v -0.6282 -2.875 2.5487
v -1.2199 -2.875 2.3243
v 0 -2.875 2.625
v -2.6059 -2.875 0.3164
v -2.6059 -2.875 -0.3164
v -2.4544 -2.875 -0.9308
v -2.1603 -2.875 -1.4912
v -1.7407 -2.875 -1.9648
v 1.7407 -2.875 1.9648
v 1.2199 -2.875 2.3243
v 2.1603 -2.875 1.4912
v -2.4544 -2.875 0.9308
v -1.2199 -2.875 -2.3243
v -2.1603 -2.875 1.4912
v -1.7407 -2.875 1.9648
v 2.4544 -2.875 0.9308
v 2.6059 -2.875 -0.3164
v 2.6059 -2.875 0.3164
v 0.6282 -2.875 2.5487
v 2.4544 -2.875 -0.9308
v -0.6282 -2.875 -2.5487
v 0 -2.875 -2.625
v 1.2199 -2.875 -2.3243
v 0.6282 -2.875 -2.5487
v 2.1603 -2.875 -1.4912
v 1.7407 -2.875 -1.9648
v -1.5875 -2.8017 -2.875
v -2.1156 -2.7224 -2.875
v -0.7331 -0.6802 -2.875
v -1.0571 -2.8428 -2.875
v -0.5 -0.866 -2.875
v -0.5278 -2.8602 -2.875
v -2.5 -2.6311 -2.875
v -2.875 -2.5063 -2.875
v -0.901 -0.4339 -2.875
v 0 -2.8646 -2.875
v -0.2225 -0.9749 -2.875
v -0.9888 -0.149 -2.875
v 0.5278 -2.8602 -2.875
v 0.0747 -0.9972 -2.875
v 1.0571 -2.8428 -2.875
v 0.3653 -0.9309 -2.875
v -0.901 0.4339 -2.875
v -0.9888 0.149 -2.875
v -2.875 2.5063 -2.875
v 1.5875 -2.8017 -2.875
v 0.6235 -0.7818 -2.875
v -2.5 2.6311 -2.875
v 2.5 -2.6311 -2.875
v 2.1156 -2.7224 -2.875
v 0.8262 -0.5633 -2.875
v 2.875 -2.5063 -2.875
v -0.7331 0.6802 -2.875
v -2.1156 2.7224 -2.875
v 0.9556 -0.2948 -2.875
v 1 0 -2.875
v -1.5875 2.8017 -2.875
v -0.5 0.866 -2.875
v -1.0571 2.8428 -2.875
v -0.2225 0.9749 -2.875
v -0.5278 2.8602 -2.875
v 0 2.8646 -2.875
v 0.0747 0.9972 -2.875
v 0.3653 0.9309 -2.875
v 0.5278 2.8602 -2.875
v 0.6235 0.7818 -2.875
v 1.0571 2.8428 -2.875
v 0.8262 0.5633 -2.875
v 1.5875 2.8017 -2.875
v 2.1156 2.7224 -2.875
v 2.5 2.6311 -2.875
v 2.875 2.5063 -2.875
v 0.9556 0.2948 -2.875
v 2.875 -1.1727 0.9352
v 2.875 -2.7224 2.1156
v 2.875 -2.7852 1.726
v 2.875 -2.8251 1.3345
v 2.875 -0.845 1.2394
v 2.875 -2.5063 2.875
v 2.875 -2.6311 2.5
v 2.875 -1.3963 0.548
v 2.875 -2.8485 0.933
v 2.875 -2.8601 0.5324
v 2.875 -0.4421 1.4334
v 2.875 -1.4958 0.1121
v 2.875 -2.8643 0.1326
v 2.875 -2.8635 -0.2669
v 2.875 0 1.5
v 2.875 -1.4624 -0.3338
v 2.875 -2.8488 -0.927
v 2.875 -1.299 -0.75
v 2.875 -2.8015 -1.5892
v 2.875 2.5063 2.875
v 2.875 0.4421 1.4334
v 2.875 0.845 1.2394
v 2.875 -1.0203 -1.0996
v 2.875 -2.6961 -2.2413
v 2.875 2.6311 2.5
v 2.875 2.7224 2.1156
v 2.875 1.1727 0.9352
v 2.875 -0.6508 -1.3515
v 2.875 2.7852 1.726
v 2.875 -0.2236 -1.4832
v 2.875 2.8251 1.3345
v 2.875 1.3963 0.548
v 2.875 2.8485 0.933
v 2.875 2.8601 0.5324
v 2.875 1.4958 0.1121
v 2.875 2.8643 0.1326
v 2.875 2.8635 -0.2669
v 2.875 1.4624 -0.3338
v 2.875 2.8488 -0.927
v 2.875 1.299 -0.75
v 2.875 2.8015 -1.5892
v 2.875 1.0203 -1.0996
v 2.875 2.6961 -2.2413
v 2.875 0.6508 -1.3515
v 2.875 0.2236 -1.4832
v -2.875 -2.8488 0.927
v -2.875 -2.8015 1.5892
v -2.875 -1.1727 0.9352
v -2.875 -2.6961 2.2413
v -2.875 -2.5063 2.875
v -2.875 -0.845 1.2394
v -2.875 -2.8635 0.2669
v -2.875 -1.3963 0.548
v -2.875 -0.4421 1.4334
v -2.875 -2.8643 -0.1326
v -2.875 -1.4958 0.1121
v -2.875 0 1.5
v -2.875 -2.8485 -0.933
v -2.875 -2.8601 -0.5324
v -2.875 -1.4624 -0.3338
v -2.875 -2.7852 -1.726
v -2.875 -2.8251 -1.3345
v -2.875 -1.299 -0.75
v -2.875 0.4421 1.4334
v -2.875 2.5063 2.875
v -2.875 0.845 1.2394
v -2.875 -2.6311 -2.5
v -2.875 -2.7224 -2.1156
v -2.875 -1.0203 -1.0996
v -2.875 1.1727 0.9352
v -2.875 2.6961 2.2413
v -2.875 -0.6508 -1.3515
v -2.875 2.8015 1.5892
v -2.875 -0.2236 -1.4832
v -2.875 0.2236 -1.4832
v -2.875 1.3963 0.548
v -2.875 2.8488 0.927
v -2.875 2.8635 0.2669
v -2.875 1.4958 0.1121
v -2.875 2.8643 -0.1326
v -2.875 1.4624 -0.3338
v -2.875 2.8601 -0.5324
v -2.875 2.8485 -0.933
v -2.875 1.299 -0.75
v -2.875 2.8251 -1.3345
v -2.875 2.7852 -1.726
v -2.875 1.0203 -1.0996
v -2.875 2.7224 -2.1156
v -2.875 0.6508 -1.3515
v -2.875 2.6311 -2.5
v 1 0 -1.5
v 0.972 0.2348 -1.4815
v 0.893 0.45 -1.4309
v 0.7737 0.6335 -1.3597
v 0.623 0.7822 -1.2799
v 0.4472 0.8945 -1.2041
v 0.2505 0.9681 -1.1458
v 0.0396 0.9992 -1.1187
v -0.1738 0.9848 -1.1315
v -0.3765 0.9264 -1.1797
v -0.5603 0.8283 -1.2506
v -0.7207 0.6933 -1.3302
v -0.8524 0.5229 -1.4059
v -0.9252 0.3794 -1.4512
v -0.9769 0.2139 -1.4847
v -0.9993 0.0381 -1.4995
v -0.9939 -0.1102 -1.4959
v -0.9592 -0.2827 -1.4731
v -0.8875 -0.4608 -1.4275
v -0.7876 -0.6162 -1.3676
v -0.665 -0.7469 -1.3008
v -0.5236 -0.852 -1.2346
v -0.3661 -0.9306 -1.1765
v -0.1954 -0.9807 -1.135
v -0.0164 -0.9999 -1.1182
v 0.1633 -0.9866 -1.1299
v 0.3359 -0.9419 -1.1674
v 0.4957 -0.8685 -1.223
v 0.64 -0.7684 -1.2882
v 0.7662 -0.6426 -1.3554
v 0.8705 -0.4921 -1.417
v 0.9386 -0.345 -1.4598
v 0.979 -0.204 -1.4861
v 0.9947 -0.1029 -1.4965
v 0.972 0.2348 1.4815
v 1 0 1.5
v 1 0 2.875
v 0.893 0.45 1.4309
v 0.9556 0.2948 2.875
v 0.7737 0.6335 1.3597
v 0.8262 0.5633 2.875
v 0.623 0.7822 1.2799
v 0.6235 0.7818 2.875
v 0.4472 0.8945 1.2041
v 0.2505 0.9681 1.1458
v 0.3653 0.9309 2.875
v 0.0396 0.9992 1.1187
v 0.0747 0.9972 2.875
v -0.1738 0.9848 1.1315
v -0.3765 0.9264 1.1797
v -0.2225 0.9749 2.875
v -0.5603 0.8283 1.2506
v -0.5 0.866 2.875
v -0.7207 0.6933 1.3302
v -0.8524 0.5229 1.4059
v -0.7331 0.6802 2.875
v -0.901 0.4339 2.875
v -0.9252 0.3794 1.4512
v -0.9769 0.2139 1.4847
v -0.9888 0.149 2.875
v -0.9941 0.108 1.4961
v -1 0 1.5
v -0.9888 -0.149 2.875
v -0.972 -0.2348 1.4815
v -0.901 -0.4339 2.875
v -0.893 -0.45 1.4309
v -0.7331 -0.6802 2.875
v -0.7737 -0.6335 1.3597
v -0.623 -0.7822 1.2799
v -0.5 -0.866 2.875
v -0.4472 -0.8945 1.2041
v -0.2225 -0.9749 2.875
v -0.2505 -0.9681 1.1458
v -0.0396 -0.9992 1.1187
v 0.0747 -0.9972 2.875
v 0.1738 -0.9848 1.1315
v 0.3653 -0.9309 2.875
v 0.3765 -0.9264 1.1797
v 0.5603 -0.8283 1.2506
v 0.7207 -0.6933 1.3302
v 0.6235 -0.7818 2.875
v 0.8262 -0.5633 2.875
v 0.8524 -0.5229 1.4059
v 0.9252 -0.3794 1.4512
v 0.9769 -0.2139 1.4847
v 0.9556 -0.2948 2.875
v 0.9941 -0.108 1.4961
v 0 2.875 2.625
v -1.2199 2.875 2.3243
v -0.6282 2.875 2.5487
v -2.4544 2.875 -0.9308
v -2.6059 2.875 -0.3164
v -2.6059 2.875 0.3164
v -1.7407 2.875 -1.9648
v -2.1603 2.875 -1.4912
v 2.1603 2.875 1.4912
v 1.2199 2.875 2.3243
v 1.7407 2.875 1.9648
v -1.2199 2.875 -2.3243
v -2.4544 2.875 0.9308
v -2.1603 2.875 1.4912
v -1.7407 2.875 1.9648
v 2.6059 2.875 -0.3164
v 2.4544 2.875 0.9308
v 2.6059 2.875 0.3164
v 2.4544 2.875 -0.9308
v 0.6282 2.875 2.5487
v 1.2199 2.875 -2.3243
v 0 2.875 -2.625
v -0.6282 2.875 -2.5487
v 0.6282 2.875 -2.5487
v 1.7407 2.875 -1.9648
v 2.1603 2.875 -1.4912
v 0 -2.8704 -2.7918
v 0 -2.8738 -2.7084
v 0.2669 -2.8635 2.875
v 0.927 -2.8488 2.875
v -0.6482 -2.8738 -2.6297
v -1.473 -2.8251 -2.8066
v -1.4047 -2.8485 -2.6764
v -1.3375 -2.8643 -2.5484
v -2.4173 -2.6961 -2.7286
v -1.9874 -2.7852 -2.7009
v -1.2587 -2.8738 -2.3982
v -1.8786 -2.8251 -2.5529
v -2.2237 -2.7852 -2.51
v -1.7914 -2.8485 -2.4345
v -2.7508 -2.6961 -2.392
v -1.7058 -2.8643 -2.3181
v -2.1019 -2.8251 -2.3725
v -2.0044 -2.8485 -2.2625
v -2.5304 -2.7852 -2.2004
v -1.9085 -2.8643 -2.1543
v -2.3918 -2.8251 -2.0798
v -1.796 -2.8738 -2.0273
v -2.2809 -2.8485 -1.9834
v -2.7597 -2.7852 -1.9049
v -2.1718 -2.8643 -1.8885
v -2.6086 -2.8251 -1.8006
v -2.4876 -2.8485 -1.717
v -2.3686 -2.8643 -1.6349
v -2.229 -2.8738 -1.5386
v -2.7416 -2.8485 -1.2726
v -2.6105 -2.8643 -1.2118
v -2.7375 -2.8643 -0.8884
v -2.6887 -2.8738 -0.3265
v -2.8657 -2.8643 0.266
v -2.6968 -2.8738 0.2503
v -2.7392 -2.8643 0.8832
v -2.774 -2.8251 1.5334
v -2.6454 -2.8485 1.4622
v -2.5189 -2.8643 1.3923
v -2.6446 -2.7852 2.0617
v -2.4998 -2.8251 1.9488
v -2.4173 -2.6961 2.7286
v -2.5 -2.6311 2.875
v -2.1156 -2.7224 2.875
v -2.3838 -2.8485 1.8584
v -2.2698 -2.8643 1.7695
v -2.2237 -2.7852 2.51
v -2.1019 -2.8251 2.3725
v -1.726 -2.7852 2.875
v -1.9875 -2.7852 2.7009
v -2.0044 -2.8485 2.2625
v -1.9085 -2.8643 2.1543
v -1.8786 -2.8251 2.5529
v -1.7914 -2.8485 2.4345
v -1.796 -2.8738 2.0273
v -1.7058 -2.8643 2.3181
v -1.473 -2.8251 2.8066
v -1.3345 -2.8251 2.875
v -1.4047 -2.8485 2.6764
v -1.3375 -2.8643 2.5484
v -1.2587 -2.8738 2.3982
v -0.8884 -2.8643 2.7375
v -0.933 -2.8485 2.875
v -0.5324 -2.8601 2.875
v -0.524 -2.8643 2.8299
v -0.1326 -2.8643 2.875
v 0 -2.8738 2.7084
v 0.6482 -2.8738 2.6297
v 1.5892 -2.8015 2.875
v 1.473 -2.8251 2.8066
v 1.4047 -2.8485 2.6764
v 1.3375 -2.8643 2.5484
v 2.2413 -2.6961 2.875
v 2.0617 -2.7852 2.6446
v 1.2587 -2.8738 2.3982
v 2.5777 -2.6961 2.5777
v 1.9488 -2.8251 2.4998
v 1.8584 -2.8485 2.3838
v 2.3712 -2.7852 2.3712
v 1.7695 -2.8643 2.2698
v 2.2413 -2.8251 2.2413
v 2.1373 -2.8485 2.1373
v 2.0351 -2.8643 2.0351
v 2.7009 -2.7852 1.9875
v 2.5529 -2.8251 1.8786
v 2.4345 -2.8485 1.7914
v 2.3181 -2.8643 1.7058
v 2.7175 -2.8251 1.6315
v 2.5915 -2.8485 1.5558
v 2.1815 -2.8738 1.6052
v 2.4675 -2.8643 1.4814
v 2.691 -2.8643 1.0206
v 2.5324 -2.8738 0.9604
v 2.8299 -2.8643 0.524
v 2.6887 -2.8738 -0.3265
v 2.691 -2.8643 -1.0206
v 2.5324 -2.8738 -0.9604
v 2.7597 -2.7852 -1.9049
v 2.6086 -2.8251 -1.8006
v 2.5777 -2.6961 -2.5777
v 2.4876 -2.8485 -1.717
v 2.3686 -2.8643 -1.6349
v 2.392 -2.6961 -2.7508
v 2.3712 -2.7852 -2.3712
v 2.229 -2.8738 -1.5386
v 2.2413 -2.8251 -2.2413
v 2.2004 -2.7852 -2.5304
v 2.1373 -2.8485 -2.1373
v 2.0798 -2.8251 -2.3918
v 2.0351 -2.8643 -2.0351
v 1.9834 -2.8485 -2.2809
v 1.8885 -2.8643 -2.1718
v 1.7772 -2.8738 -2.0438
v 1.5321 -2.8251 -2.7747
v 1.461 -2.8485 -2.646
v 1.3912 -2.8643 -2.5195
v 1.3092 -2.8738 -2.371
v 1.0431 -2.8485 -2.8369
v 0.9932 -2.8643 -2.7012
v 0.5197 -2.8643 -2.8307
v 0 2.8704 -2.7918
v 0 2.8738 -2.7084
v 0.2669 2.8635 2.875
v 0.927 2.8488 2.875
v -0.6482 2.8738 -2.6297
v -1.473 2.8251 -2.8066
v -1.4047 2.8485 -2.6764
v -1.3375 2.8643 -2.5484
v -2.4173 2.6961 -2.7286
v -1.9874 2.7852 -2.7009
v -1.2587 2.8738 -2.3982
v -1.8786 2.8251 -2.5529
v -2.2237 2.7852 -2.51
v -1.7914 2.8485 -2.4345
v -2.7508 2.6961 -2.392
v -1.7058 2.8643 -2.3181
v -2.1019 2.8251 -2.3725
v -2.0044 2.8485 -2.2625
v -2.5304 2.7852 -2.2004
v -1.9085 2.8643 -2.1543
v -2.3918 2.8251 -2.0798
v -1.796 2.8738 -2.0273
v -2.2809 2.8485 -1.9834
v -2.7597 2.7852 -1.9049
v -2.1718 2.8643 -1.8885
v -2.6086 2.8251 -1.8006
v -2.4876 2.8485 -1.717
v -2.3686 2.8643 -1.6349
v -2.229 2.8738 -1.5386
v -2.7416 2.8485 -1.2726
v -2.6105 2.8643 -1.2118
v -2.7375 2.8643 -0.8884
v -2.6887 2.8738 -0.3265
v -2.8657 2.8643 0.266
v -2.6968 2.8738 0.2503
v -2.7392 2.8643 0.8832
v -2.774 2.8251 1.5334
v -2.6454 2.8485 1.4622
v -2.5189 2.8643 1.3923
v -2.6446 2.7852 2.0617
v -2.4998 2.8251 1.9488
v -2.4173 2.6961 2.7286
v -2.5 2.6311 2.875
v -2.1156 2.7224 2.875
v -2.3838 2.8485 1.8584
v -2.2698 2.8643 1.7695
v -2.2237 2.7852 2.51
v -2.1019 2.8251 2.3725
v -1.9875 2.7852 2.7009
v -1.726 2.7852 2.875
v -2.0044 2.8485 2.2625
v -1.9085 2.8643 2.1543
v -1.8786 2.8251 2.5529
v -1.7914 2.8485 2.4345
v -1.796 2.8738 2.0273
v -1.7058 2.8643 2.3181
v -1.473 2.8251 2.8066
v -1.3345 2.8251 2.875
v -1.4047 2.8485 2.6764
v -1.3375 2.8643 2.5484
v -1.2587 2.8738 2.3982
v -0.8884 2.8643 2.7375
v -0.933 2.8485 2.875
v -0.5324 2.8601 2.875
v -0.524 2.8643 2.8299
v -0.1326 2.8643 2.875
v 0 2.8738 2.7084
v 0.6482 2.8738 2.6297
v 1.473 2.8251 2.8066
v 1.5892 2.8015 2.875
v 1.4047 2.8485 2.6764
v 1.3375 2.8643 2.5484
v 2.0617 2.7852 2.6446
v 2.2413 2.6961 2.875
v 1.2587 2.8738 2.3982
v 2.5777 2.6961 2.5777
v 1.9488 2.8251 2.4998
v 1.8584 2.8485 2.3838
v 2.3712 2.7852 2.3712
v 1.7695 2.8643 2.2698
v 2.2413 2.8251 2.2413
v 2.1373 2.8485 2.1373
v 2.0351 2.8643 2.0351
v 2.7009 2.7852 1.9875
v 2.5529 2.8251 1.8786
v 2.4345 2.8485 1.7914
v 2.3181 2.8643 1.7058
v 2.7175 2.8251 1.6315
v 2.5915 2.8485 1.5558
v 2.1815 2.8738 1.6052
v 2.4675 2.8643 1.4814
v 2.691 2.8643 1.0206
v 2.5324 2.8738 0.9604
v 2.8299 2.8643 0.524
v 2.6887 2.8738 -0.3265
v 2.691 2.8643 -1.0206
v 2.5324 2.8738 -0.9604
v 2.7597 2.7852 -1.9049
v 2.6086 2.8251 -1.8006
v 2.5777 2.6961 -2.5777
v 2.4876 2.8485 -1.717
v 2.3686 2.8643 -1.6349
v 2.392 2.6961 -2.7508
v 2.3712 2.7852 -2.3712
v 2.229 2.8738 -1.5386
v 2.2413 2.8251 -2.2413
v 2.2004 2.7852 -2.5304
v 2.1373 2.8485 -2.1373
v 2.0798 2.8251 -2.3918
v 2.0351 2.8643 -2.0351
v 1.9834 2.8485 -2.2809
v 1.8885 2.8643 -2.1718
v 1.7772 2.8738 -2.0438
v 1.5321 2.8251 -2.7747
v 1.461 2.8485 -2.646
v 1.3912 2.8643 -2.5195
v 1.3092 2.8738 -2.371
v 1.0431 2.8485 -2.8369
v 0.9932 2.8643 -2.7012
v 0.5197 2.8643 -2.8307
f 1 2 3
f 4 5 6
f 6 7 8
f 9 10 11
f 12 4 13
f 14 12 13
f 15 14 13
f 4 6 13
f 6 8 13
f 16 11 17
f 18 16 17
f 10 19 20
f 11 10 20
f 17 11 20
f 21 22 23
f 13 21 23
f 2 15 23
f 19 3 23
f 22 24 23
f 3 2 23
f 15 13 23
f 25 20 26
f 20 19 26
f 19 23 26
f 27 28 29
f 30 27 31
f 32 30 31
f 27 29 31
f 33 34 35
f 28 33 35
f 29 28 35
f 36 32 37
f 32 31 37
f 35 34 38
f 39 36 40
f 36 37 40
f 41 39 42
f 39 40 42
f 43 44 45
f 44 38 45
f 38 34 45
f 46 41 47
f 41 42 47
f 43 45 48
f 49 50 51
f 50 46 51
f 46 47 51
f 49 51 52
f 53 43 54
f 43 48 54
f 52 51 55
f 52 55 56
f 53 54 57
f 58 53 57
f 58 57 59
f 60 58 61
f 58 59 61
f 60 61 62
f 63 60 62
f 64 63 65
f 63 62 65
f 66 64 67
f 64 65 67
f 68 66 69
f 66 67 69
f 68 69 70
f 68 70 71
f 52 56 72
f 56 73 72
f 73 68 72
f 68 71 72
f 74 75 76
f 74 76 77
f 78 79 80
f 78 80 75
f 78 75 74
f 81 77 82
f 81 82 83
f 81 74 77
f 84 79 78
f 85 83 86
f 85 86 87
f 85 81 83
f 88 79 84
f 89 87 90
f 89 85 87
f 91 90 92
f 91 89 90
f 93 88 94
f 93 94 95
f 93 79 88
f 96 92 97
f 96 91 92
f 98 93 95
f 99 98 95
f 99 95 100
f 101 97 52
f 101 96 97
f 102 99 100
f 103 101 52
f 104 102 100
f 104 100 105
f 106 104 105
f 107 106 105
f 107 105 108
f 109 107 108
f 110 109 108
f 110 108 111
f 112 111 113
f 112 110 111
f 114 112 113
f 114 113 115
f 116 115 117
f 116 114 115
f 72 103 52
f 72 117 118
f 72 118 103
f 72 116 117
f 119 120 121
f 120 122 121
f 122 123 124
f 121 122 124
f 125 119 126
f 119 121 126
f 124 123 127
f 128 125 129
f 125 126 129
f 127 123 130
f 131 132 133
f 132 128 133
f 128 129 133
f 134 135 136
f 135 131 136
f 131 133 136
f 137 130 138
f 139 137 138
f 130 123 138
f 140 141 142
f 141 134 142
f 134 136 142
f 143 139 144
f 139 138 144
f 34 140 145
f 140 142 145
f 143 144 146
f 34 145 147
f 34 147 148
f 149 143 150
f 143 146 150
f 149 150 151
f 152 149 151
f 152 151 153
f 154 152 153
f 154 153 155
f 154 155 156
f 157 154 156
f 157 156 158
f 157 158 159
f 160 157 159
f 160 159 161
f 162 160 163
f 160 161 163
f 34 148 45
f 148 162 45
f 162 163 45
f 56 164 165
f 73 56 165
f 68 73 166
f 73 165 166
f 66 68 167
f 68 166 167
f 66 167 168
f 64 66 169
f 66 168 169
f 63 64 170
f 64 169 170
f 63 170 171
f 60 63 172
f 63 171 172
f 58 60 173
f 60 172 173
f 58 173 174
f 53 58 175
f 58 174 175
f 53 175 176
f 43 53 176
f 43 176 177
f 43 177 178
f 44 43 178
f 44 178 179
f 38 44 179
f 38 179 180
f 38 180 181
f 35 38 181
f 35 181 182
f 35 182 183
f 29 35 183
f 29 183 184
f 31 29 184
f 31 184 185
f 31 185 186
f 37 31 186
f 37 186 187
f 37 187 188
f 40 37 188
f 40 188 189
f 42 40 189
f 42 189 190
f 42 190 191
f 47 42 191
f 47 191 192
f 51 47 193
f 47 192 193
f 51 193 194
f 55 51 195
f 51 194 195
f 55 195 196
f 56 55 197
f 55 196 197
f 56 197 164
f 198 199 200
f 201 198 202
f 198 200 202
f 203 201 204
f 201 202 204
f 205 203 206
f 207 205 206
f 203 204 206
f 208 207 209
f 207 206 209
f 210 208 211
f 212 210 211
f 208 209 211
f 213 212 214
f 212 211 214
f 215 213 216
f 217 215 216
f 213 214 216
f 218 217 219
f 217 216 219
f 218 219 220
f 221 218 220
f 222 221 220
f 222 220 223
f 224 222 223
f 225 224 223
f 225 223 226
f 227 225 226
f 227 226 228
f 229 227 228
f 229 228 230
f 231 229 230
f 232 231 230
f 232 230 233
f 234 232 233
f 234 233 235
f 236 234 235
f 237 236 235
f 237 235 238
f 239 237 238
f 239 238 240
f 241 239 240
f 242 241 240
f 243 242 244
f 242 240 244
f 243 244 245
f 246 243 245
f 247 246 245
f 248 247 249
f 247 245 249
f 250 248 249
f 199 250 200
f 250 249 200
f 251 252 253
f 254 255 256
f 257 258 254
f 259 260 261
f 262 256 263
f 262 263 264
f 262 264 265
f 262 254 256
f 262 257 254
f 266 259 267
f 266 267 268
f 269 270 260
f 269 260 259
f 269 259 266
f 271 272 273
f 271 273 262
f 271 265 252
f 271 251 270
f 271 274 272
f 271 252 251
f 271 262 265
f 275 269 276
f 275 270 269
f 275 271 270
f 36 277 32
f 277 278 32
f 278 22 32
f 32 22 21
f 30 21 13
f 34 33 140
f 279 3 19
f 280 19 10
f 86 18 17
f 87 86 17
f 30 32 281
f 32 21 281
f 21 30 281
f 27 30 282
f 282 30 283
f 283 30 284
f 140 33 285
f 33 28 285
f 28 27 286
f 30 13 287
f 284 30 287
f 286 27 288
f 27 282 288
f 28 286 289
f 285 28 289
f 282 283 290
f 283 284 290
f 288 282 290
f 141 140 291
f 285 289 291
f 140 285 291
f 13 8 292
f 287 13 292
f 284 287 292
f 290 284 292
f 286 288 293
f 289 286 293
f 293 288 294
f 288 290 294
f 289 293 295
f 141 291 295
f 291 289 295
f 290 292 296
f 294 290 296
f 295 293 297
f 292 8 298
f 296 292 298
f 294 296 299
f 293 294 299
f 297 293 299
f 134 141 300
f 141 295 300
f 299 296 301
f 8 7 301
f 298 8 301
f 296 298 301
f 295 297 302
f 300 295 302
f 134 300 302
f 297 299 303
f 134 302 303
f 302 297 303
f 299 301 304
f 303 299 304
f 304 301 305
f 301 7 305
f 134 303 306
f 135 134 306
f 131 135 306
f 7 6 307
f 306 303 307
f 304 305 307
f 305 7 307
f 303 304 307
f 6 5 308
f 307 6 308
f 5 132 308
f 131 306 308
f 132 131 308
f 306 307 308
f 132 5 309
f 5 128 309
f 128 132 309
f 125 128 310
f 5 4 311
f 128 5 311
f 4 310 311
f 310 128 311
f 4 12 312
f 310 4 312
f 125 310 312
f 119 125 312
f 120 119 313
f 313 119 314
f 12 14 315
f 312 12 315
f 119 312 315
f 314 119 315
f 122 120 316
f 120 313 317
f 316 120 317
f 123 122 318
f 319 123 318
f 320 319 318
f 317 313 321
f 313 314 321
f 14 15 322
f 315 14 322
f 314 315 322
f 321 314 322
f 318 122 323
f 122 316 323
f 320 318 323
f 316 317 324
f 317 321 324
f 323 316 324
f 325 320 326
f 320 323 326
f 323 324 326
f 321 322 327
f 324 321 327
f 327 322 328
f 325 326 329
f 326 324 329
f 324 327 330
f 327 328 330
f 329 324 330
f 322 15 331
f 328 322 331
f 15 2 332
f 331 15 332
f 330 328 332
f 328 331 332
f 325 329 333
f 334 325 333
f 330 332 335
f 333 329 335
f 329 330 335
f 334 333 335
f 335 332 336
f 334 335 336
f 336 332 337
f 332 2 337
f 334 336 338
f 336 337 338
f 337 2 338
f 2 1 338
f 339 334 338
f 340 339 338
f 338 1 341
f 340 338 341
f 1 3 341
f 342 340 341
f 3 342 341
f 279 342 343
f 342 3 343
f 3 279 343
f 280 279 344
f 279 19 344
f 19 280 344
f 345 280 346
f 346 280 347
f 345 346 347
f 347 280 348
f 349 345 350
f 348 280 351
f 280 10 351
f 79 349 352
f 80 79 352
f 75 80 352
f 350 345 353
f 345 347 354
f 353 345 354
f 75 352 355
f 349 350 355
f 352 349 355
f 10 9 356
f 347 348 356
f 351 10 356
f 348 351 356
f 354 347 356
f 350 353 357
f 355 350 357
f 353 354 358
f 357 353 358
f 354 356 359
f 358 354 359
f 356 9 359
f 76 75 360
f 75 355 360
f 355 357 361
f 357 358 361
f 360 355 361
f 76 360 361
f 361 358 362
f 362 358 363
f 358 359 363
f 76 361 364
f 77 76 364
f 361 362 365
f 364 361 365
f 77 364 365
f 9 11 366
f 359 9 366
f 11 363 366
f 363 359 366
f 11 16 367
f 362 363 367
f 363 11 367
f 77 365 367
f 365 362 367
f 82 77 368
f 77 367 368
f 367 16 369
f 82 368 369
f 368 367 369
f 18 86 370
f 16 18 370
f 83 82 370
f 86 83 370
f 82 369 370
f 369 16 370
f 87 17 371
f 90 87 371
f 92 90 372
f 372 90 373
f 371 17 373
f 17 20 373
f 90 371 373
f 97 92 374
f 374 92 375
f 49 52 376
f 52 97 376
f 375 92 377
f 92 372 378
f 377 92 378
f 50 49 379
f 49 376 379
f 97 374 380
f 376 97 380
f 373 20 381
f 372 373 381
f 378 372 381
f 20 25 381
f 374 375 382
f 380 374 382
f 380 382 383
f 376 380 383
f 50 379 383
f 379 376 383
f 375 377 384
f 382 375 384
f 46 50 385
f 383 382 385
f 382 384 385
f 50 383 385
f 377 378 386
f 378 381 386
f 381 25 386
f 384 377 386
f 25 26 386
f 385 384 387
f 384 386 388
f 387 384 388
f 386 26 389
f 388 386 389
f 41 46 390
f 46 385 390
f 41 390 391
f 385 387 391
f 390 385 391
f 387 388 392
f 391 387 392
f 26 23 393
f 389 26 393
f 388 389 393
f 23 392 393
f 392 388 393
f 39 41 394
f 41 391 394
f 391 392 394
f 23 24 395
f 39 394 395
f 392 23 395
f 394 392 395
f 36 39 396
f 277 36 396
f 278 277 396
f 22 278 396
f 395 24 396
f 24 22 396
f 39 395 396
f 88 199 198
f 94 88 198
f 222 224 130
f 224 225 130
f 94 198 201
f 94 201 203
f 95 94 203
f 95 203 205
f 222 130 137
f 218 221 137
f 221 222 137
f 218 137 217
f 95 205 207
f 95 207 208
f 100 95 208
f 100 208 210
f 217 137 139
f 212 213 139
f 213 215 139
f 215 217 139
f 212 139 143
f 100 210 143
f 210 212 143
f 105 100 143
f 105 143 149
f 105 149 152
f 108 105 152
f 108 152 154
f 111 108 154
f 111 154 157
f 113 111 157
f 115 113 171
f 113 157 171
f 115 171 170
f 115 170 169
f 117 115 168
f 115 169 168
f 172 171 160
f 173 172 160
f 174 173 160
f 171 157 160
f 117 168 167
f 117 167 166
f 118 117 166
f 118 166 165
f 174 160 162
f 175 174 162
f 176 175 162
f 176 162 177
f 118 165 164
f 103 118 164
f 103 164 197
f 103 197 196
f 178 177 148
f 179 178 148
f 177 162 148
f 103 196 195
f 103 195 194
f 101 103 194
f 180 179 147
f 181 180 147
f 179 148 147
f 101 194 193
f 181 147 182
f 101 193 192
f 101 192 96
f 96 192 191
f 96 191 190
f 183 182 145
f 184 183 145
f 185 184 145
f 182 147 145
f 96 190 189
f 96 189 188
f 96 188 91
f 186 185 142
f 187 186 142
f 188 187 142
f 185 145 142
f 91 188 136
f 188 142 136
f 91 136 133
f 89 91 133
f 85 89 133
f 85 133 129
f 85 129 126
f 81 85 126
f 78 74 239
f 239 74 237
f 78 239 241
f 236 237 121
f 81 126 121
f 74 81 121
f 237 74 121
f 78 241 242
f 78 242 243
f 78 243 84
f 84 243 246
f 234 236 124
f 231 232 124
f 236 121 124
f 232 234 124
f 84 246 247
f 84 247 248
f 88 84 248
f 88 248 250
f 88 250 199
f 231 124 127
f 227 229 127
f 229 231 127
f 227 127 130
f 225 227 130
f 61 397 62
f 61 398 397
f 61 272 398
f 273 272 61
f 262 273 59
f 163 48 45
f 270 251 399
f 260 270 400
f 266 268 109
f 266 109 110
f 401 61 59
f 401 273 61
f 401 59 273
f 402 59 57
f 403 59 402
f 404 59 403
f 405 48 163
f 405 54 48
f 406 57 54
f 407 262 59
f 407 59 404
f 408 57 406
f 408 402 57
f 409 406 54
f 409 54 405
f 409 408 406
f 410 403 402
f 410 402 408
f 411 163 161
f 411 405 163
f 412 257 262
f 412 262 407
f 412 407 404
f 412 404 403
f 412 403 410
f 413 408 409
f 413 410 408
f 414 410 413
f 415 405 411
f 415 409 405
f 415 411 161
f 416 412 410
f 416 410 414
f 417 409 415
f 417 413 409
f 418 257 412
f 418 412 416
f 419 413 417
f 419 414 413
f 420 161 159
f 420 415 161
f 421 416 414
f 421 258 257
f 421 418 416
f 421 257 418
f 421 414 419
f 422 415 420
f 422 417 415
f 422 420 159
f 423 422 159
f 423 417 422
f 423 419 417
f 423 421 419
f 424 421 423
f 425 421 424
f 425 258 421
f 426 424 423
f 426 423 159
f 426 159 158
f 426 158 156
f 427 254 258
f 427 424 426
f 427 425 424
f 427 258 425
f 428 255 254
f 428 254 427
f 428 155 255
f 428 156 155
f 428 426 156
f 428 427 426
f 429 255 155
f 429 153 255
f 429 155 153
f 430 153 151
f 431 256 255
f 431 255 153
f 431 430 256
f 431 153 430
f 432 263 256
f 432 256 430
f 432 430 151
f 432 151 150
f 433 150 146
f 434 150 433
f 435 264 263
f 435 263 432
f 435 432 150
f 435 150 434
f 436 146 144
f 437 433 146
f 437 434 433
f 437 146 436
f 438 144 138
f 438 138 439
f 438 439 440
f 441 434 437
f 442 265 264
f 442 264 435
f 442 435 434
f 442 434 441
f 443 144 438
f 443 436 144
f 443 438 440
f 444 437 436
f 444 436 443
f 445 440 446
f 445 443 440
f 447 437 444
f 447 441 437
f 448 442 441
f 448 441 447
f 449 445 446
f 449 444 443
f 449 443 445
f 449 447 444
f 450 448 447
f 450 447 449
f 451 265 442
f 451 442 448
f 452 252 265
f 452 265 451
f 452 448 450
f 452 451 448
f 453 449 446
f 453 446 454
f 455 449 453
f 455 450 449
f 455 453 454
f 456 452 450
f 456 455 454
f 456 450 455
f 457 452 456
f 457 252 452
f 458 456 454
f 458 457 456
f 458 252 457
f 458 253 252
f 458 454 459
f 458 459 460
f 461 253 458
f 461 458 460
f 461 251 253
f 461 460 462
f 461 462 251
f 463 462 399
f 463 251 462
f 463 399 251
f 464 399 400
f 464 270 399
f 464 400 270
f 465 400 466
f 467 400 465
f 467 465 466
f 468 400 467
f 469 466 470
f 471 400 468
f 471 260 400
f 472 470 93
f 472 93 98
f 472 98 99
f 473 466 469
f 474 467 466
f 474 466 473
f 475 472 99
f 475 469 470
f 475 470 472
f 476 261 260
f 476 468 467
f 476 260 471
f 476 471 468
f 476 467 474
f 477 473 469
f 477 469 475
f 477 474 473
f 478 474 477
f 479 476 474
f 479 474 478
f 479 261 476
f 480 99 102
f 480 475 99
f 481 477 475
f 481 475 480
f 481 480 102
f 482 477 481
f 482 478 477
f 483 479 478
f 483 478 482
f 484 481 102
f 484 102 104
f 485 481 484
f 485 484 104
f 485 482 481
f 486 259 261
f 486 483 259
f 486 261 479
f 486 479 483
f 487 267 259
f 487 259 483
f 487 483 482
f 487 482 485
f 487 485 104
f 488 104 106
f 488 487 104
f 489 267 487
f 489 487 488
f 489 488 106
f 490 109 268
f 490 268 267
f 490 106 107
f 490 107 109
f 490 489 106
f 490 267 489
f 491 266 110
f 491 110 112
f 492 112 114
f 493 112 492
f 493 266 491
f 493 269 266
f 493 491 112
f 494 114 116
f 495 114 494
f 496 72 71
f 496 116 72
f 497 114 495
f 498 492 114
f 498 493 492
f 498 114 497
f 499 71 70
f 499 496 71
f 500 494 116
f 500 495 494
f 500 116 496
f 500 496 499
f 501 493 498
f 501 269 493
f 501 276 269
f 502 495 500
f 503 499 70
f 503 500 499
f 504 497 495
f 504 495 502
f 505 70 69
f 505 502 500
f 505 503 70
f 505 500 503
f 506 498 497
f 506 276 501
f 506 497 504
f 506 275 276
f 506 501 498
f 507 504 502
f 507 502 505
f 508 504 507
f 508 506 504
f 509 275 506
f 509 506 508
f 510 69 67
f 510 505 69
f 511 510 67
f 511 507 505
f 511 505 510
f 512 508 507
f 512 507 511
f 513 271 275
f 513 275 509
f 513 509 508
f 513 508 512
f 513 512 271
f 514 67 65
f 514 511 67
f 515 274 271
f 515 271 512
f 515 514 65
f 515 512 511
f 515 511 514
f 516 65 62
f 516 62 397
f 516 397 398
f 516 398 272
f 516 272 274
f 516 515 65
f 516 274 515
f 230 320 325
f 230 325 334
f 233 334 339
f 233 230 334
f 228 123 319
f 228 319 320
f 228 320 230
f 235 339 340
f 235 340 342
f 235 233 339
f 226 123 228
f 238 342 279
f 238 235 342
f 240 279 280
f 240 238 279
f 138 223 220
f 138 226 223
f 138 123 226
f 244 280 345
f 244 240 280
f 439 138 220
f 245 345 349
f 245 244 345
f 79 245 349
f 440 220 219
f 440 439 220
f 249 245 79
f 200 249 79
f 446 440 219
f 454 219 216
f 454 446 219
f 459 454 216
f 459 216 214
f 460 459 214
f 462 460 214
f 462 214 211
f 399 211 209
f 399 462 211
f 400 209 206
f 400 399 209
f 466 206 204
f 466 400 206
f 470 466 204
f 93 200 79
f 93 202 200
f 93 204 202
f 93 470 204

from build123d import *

# Parameters (mm, degrees)
SKETCH1_W           = 5.75
SKETCH1_H           = 5.75
BOSS_EXTRUDE1_DEPTH = 2.875
CUT_EXTRUDE1_REACH  = 9.042
SKETCH2_R           = 1
SKETCH3_R           = 1.5
CUT_EXTRUDE2_DEPTH  = 8.042283011


with BuildPart() as part:
    # Sketch1 → Boss-Extrude1 (new, symmetric)
    with BuildSketch(Plane(origin=(0, 0, 0), x_dir=(1, 0, 0), z_dir=(0, 1, 0))):
        Rectangle(SKETCH1_W, SKETCH1_H)
    extrude(amount=BOSS_EXTRUDE1_DEPTH, both=True)

    # Sketch2 → Cut-Extrude1 (cut, up to next)
    with BuildSketch(Plane.XY.offset(2.875), mode=Mode.PRIVATE) as cut_extrude1_sk1:
        Circle(SKETCH2_R)
    cut_extrude1_tool1 = extrude(cut_extrude1_sk1.sketch, amount=-CUT_EXTRUDE1_REACH, mode=Mode.PRIVATE) & part.part
    add(cut_extrude1_tool1.solids().sort_by_distance((0, 0, 2.875))[0], mode=Mode.SUBTRACT)

    # Sketch3 → Cut-Extrude2 (cut, through all)
    with BuildSketch(Plane.ZY.offset(2.875)):
        Circle(SKETCH3_R)
    extrude(amount=-CUT_EXTRUDE2_DEPTH, mode=Mode.SUBTRACT)

    # Sketch4 → Cut-Revolve1 (revolve, cut)
    with BuildSketch(Plane.XY, mode=Mode.PRIVATE) as cut_revolve1_sk:
        with BuildLine():
            Line((2.625, 2.875), (5.625, 2.875))
            Line((5.625, 2.875), (5.625, -0.125))
            ThreePointArc((5.625, -0.125), (4.746320344, 1.996320344), (2.625, 2.875))
        make_face()
    cut_revolve1 = revolve(cut_revolve1_sk.sketch.rotate(Axis((0, 0, 0), (0, 1, 0)), 90), axis=Axis((0, 0, 0), (0, 1, 0)), mode=Mode.SUBTRACT)

    # Mirror1: Cut-Revolve1 across plane
    add(cut_revolve1.mirror(Plane.ZX), mode=Mode.SUBTRACT)


solid = part.part
